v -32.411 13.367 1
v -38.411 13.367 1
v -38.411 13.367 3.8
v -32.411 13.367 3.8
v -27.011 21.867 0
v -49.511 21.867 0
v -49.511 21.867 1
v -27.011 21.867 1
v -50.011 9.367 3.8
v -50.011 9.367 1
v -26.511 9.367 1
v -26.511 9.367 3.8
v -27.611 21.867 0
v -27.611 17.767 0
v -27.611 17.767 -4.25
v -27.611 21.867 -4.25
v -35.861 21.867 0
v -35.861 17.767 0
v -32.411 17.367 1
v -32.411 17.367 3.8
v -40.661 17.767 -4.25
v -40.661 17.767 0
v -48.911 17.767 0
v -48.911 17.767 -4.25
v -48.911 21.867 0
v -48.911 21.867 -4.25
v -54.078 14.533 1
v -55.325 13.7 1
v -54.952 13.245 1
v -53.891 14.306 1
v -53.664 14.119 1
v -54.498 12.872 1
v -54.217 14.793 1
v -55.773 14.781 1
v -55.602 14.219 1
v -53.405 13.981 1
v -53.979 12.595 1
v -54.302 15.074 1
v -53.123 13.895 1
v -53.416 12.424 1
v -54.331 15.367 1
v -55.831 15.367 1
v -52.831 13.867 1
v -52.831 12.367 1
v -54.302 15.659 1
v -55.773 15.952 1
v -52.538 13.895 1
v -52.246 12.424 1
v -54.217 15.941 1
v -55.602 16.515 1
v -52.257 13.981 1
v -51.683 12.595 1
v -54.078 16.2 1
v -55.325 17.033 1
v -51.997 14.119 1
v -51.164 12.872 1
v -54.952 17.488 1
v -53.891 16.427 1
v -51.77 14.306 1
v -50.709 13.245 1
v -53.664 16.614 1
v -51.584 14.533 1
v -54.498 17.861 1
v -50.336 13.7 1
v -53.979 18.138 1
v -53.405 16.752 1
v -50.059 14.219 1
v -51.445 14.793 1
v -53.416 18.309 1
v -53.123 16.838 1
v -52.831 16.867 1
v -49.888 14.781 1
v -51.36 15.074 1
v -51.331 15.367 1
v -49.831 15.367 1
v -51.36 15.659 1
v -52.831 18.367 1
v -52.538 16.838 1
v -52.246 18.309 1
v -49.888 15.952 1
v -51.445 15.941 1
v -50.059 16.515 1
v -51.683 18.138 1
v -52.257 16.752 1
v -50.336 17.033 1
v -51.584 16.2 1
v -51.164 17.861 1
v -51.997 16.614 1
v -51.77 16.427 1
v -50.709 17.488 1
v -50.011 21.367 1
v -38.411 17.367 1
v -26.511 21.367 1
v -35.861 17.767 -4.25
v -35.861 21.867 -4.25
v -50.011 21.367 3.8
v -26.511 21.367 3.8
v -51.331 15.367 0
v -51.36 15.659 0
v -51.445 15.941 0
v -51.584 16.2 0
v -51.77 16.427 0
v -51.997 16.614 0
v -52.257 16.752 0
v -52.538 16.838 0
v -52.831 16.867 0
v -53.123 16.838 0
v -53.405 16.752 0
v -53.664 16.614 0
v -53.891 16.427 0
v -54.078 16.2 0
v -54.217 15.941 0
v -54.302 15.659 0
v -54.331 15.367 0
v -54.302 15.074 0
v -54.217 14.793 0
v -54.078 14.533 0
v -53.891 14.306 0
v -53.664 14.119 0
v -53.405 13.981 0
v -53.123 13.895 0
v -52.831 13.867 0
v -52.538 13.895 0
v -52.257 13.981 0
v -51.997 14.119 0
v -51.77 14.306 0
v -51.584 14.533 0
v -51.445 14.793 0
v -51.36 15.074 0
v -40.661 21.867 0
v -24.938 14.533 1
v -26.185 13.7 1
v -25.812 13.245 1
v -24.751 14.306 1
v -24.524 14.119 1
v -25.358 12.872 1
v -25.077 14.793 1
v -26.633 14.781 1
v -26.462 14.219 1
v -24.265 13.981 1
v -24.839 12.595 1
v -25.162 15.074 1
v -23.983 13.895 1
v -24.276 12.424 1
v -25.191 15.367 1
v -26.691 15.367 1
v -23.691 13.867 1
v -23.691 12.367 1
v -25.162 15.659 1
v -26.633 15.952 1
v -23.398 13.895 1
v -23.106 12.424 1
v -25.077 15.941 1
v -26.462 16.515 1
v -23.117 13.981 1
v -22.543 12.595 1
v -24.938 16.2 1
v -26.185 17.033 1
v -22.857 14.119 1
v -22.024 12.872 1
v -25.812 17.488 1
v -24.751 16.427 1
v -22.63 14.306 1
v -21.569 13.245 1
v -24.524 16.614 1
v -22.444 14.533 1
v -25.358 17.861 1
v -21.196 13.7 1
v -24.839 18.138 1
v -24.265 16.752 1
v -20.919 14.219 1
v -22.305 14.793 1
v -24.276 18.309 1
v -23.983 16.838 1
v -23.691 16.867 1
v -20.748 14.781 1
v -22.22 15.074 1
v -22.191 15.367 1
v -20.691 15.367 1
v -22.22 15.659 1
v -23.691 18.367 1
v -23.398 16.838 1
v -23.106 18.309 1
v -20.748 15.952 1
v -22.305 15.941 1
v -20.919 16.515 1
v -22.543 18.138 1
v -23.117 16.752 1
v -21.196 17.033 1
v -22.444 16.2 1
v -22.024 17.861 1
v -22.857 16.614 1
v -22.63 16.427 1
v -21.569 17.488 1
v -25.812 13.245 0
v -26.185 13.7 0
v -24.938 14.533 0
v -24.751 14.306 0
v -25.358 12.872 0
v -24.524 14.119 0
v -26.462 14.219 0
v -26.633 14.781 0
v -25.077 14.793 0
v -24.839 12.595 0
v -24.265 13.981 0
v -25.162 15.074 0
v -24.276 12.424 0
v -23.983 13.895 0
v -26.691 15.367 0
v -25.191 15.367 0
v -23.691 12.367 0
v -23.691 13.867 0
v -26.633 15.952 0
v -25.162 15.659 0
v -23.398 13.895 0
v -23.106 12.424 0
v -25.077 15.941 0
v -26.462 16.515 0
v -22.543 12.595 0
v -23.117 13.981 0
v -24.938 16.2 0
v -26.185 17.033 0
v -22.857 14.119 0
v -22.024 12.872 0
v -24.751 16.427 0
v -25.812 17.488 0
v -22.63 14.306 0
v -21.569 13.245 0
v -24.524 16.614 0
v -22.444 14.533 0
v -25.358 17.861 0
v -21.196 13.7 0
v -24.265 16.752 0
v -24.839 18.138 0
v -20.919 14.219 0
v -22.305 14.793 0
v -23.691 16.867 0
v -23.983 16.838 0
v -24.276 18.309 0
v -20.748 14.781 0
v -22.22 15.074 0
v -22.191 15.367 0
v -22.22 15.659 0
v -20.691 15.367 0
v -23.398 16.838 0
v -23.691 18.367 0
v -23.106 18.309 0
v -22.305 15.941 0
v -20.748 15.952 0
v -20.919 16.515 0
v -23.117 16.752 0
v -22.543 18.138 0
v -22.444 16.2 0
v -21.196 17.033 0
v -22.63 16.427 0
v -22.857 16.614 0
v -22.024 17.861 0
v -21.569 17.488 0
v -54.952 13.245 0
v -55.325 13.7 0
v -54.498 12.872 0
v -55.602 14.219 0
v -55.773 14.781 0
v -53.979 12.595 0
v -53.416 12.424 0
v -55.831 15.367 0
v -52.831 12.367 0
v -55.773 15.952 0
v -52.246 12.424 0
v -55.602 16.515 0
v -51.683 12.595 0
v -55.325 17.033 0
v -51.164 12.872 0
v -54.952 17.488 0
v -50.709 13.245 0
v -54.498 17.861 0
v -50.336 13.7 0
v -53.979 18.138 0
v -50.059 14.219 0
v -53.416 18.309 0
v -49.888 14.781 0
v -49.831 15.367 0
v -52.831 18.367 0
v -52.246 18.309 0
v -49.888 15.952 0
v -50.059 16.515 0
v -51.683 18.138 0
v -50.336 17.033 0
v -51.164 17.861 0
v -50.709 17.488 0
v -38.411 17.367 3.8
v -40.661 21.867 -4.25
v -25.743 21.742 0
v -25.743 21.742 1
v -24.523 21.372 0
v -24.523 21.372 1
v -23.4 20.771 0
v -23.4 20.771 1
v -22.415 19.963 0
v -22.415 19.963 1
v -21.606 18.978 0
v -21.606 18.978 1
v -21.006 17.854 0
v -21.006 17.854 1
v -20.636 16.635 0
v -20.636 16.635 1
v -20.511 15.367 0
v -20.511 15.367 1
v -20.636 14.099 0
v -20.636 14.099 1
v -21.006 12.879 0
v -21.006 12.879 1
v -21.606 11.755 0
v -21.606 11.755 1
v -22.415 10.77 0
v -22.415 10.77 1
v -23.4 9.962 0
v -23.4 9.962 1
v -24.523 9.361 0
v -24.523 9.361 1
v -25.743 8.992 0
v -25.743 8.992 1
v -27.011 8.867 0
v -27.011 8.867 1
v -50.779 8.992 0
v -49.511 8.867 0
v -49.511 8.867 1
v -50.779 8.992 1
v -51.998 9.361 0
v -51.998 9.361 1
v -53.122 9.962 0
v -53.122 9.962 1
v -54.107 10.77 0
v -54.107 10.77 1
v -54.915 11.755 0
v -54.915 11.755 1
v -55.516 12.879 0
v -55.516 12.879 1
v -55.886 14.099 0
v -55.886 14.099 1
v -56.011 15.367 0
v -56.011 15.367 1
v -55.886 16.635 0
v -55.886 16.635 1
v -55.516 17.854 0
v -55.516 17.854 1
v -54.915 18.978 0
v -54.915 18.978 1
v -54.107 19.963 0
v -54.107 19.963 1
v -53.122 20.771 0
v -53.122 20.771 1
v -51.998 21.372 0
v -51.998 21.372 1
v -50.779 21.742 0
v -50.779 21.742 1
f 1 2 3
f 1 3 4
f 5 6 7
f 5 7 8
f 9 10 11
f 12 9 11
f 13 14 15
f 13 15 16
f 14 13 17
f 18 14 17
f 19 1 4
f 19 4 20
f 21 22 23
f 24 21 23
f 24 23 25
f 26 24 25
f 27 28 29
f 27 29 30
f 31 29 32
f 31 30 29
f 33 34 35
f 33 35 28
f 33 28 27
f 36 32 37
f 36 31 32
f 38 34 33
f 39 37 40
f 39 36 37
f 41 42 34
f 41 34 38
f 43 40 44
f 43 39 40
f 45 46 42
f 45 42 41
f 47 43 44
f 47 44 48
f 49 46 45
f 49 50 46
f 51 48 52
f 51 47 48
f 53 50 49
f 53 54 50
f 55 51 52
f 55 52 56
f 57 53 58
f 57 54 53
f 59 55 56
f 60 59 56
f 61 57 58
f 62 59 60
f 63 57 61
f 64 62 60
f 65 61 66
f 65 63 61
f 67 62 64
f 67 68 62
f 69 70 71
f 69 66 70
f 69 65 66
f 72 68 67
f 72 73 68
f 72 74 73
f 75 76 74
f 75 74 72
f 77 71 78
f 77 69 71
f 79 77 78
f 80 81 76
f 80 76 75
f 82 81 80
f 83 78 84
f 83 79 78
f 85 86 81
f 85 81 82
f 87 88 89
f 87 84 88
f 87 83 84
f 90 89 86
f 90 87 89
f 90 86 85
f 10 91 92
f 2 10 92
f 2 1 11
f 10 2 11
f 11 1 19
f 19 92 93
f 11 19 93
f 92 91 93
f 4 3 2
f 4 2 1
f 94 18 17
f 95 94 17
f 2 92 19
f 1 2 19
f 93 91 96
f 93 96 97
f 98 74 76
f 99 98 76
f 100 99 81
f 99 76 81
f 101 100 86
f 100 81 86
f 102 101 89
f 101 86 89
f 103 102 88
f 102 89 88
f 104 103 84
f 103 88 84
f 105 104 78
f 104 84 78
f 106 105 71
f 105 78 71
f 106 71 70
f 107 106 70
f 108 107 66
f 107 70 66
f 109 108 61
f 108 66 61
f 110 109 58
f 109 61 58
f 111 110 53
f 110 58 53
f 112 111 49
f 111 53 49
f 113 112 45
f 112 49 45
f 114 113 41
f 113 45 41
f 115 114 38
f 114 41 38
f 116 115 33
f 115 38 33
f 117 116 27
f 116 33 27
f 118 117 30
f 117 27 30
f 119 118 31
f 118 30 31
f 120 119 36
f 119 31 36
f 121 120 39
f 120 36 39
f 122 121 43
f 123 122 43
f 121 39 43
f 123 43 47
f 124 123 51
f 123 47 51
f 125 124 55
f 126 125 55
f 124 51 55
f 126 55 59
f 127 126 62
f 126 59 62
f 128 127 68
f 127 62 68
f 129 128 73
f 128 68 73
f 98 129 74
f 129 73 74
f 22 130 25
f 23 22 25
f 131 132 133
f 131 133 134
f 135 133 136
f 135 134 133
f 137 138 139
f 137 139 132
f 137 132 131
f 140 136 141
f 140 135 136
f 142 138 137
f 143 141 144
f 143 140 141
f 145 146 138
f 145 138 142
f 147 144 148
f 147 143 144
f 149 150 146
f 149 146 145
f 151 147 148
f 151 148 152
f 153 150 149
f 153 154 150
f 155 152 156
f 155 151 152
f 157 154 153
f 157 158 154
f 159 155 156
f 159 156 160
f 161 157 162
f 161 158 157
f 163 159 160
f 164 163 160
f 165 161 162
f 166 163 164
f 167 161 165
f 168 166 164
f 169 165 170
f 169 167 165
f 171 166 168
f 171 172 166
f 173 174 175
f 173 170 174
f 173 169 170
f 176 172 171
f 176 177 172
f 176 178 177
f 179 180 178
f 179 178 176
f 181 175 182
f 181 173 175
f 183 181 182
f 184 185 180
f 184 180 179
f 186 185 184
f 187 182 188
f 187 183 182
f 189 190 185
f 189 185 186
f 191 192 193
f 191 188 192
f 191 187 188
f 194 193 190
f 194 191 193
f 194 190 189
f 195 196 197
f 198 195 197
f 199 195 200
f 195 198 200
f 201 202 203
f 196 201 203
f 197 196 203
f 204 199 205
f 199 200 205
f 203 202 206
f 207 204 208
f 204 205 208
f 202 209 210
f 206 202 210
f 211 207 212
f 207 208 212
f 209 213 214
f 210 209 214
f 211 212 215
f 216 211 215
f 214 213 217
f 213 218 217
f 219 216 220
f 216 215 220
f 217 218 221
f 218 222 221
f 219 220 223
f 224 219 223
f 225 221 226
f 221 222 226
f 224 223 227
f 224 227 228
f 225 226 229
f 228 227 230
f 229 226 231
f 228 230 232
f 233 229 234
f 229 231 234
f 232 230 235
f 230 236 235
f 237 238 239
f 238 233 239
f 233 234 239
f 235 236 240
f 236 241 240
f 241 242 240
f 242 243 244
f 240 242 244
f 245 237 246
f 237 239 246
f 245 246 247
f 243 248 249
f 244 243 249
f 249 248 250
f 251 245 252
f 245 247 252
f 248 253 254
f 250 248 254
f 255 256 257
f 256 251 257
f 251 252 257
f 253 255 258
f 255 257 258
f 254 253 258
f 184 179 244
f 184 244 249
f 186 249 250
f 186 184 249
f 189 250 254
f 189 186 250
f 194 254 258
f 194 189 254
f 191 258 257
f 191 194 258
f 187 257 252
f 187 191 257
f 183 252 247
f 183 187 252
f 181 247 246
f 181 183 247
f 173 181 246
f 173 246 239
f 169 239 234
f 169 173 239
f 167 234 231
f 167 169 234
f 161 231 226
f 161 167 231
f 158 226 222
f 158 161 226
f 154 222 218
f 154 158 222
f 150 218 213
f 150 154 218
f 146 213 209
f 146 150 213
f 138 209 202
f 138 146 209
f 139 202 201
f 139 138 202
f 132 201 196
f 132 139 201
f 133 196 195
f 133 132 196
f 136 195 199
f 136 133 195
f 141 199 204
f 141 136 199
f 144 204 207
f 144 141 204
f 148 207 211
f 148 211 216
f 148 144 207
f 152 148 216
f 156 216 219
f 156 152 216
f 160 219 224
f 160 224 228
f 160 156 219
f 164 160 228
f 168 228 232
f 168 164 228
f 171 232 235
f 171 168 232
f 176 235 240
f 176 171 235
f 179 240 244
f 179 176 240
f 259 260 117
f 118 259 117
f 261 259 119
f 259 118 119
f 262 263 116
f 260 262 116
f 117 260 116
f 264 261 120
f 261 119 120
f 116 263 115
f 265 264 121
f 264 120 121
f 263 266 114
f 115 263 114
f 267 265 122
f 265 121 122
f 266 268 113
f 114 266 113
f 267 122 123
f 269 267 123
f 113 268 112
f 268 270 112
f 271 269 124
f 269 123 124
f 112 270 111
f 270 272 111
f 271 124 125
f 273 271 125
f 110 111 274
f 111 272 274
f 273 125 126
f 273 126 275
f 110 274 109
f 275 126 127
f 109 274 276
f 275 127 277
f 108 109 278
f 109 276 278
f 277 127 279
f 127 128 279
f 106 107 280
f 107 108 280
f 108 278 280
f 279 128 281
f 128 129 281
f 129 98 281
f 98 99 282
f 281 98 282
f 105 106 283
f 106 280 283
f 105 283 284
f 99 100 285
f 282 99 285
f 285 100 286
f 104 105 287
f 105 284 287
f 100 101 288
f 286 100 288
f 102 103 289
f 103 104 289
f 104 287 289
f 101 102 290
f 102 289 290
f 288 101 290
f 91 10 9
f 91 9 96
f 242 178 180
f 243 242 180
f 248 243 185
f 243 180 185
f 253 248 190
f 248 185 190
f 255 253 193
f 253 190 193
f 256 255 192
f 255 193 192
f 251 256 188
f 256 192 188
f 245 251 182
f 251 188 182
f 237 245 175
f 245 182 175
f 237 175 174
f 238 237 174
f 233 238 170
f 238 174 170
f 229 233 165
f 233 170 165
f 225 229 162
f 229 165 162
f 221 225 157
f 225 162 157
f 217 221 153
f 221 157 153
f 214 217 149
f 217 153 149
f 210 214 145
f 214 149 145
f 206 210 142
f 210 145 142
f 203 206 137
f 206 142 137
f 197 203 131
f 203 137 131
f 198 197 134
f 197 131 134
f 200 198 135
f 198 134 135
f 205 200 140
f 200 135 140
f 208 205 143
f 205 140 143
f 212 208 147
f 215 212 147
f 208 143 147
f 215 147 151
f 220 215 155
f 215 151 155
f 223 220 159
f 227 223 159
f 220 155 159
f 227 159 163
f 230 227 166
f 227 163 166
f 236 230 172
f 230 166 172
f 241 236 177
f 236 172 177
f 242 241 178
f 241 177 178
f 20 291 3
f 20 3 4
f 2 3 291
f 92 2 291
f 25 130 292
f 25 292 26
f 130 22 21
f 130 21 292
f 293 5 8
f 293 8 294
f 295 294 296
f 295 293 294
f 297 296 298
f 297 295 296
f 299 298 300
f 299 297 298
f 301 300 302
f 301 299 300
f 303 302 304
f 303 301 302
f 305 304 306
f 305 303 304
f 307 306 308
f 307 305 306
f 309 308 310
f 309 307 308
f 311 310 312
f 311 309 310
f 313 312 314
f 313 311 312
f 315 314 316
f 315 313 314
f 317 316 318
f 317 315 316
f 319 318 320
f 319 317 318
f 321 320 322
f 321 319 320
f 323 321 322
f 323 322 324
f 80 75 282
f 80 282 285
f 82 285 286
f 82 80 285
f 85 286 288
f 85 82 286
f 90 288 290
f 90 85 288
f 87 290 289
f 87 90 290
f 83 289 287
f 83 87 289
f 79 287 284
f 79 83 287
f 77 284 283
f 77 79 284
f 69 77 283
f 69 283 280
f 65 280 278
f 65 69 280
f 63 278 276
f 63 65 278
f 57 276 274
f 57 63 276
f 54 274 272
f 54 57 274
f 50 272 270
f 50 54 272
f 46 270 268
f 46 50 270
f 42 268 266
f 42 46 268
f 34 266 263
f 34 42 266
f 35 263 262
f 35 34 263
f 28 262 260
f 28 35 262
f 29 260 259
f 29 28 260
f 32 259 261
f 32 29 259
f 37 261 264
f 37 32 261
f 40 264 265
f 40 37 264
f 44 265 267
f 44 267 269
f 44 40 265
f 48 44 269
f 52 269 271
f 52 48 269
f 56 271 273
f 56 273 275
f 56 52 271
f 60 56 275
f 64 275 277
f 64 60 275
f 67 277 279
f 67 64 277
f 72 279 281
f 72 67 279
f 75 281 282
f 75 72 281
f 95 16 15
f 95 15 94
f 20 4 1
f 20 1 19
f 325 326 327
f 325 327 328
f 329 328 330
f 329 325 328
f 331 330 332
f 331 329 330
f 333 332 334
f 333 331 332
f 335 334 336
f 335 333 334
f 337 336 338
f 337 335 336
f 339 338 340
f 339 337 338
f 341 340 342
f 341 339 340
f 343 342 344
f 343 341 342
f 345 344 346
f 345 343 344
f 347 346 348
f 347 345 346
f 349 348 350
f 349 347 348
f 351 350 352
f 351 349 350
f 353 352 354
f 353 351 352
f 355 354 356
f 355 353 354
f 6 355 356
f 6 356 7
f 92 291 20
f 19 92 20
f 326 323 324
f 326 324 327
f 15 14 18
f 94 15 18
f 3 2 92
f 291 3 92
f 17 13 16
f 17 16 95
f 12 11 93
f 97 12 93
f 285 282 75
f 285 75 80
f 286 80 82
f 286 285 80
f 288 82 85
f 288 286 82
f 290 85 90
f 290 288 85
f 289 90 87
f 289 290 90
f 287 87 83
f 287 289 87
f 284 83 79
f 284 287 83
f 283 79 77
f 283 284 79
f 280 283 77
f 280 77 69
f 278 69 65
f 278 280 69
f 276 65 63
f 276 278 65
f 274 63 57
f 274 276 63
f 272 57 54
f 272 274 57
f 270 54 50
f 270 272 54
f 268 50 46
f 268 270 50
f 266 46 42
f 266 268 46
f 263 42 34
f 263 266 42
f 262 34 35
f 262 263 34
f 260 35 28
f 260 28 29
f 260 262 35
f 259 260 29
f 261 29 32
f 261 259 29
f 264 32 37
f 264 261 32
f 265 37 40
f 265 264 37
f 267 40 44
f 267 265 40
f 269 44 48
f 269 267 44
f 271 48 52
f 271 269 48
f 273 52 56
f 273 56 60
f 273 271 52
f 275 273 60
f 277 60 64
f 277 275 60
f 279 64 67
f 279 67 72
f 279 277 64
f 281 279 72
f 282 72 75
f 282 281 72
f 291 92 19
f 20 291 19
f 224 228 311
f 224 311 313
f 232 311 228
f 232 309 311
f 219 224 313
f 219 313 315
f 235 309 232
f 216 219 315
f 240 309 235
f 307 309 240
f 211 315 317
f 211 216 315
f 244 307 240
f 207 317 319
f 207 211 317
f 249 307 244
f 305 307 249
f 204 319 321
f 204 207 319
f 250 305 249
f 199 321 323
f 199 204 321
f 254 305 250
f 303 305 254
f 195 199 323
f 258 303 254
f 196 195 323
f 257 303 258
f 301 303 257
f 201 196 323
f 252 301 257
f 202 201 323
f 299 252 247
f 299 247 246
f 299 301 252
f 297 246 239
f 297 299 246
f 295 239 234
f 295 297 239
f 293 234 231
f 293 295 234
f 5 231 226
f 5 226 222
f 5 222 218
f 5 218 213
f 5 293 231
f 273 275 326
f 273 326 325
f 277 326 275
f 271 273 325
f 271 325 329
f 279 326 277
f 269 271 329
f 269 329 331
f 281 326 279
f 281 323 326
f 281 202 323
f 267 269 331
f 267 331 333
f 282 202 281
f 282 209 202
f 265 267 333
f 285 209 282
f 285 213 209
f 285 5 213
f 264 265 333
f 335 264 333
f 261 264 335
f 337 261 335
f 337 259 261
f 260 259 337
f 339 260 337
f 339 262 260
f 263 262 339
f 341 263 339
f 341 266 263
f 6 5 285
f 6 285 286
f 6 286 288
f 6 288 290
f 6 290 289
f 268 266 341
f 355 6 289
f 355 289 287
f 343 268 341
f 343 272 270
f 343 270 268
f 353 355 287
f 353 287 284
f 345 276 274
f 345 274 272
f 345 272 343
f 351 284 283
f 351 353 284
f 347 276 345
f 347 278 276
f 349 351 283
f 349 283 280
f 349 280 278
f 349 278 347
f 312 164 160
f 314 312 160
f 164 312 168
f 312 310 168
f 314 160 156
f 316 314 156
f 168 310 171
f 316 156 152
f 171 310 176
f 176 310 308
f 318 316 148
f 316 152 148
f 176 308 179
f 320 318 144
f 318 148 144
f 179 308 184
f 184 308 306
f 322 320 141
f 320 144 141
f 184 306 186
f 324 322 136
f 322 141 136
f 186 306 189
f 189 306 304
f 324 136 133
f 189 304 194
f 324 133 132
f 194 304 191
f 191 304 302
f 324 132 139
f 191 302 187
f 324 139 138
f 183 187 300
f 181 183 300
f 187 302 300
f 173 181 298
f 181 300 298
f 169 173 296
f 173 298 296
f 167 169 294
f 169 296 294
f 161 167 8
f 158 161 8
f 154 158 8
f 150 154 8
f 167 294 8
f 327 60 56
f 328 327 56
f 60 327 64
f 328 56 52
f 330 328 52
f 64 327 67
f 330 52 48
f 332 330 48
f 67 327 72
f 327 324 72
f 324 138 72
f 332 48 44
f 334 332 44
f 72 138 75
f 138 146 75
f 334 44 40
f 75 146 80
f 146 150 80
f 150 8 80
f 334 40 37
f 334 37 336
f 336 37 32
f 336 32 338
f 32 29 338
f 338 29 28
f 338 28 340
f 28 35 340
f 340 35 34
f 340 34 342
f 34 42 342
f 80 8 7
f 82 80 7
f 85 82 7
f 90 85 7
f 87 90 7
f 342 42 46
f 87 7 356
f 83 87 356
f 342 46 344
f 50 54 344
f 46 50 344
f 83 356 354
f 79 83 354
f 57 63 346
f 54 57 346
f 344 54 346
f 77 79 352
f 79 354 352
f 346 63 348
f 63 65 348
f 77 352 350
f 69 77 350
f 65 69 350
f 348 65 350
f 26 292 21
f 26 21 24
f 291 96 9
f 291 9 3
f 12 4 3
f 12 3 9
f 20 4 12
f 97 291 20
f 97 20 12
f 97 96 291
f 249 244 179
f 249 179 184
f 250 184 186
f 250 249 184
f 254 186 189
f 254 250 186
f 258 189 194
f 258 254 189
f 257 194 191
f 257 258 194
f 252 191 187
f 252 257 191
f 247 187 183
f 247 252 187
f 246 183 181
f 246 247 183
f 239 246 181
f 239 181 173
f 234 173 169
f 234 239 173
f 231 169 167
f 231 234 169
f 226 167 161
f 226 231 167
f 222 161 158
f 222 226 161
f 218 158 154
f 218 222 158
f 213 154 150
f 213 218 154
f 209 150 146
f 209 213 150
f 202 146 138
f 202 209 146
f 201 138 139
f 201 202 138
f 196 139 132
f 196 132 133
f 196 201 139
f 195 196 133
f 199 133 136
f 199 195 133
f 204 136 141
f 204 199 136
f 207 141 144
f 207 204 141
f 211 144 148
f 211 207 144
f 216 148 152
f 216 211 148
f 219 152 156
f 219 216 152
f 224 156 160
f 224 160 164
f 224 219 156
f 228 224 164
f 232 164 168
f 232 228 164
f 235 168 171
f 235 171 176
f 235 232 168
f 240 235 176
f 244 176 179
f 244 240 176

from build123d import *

# Parameters (mm, degrees)
SKETCH_1_R        = 3
EXTRUDE_1_DEPTH   = 1
SKETCH_2_R        = 3
SKETCH_2_R_2      = 1.5
EXTRUDE_2_DEPTH   = 1
EXTRUDE_2_2_DEPTH = 1
SKETCH_3_W        = 23.5
SKETCH_3_H        = 12
SKETCH_3_W_2      = 6
SKETCH_3_H_2      = 4
EXTRUDE_3_DEPTH   = 2.8
SKETCH_4_W        = 6
SKETCH_4_H        = 4
EXTRUDE_4_DEPTH   = 2.8
SKETCH_5_W        = 8.25
SKETCH_5_H        = 4.1
EXTRUDE_5_DEPTH   = 4.25
EXTRUDE_5_2_DEPTH = 4.25


with BuildPart() as part:
    # 草图1 → 凸台-拉伸1 (new body)
    with BuildSketch(Plane.XY):
        with BuildLine():
            Line((-49.510803888, 21.866656957), (-27.010803888, 21.866656957))
            ThreePointArc((-27.010803888, 21.866656957), (-20.510803888, 15.366656957), (-27.010803888, 8.866656957))
            Line((-27.010803888, 8.866656957), (-49.510803888, 8.866656957))
            ThreePointArc((-49.510803888, 8.866656957), (-56.010803888, 15.366656957), (-49.510803888, 21.866656957))
        make_face()
        with Locations((-52.830803888, 15.366656957)):
            Circle(SKETCH_1_R, mode=Mode.SUBTRACT)
        with Locations((-23.690803888, 15.366656957)):
            Circle(SKETCH_1_R, mode=Mode.SUBTRACT)
    extrude(amount=EXTRUDE_1_DEPTH)


with BuildPart() as body_2:
    # 草图2 → 凸台-拉伸2 (new body)
    with BuildSketch(Plane.XY.offset(1)):
        with Locations((-23.690803888, 15.366656957)):
            Circle(SKETCH_2_R)
        with Locations((-23.690803888, 15.366656957)):
            Circle(SKETCH_2_R_2, mode=Mode.SUBTRACT)
    extrude(amount=-EXTRUDE_2_DEPTH)


with BuildPart() as body_3:
    # 草图2 → Extrude 2 2 (new body)
    with BuildSketch(Plane.XY.offset(1)):
        with Locations((-52.830803888, 15.366656957)):
            Circle(SKETCH_2_R)
        with Locations((-52.830803888, 15.366656957)):
            Circle(SKETCH_2_R_2, mode=Mode.SUBTRACT)
    extrude(amount=-EXTRUDE_2_2_DEPTH)


with BuildPart() as body_4:
    # 草图3 → 凸台-拉伸3 (new body)
    with BuildSketch(Plane.XY.offset(1)):
        with Locations((-38.260803888, 15.366656957)):
            Rectangle(SKETCH_3_W, SKETCH_3_H)
        with Locations((-35.410803888, 15.366656957)):
            Rectangle(SKETCH_3_W_2, SKETCH_3_H_2, mode=Mode.SUBTRACT)
    extrude(amount=EXTRUDE_3_DEPTH)


with BuildPart() as body_5:
    # 草图4 → 凸台-拉伸4 (new body)
    with BuildSketch(Plane.XY.offset(3.8)):
        with Locations((-35.410803888, 15.366656957)):
            Rectangle(SKETCH_4_W, SKETCH_4_H)
    extrude(amount=-EXTRUDE_4_DEPTH)


with BuildPart() as body_6:
    # 草图5 → 凸台-拉伸5 (new body)
    with BuildSketch(Plane(origin=(0, 0, 0), x_dir=(-1, 0, 0), z_dir=(0, 0, -1))):
        with Locations((31.735803888, 19.816656957)):
            Rectangle(SKETCH_5_W, SKETCH_5_H)
    extrude(amount=EXTRUDE_5_DEPTH)


with BuildPart() as body_7:
    # 草图5 → Extrude 5 2 (new body)
    with BuildSketch(Plane(origin=(0, 0, 0), x_dir=(-1, 0, 0), z_dir=(0, 0, -1))):
        with Locations((44.785803888, 19.816656957)):
            Rectangle(SKETCH_5_W, SKETCH_5_H)
    extrude(amount=EXTRUDE_5_2_DEPTH)


solid = Compound([part.part, body_2.part, body_3.part, body_4.part, body_5.part, body_6.part, body_7.part])
